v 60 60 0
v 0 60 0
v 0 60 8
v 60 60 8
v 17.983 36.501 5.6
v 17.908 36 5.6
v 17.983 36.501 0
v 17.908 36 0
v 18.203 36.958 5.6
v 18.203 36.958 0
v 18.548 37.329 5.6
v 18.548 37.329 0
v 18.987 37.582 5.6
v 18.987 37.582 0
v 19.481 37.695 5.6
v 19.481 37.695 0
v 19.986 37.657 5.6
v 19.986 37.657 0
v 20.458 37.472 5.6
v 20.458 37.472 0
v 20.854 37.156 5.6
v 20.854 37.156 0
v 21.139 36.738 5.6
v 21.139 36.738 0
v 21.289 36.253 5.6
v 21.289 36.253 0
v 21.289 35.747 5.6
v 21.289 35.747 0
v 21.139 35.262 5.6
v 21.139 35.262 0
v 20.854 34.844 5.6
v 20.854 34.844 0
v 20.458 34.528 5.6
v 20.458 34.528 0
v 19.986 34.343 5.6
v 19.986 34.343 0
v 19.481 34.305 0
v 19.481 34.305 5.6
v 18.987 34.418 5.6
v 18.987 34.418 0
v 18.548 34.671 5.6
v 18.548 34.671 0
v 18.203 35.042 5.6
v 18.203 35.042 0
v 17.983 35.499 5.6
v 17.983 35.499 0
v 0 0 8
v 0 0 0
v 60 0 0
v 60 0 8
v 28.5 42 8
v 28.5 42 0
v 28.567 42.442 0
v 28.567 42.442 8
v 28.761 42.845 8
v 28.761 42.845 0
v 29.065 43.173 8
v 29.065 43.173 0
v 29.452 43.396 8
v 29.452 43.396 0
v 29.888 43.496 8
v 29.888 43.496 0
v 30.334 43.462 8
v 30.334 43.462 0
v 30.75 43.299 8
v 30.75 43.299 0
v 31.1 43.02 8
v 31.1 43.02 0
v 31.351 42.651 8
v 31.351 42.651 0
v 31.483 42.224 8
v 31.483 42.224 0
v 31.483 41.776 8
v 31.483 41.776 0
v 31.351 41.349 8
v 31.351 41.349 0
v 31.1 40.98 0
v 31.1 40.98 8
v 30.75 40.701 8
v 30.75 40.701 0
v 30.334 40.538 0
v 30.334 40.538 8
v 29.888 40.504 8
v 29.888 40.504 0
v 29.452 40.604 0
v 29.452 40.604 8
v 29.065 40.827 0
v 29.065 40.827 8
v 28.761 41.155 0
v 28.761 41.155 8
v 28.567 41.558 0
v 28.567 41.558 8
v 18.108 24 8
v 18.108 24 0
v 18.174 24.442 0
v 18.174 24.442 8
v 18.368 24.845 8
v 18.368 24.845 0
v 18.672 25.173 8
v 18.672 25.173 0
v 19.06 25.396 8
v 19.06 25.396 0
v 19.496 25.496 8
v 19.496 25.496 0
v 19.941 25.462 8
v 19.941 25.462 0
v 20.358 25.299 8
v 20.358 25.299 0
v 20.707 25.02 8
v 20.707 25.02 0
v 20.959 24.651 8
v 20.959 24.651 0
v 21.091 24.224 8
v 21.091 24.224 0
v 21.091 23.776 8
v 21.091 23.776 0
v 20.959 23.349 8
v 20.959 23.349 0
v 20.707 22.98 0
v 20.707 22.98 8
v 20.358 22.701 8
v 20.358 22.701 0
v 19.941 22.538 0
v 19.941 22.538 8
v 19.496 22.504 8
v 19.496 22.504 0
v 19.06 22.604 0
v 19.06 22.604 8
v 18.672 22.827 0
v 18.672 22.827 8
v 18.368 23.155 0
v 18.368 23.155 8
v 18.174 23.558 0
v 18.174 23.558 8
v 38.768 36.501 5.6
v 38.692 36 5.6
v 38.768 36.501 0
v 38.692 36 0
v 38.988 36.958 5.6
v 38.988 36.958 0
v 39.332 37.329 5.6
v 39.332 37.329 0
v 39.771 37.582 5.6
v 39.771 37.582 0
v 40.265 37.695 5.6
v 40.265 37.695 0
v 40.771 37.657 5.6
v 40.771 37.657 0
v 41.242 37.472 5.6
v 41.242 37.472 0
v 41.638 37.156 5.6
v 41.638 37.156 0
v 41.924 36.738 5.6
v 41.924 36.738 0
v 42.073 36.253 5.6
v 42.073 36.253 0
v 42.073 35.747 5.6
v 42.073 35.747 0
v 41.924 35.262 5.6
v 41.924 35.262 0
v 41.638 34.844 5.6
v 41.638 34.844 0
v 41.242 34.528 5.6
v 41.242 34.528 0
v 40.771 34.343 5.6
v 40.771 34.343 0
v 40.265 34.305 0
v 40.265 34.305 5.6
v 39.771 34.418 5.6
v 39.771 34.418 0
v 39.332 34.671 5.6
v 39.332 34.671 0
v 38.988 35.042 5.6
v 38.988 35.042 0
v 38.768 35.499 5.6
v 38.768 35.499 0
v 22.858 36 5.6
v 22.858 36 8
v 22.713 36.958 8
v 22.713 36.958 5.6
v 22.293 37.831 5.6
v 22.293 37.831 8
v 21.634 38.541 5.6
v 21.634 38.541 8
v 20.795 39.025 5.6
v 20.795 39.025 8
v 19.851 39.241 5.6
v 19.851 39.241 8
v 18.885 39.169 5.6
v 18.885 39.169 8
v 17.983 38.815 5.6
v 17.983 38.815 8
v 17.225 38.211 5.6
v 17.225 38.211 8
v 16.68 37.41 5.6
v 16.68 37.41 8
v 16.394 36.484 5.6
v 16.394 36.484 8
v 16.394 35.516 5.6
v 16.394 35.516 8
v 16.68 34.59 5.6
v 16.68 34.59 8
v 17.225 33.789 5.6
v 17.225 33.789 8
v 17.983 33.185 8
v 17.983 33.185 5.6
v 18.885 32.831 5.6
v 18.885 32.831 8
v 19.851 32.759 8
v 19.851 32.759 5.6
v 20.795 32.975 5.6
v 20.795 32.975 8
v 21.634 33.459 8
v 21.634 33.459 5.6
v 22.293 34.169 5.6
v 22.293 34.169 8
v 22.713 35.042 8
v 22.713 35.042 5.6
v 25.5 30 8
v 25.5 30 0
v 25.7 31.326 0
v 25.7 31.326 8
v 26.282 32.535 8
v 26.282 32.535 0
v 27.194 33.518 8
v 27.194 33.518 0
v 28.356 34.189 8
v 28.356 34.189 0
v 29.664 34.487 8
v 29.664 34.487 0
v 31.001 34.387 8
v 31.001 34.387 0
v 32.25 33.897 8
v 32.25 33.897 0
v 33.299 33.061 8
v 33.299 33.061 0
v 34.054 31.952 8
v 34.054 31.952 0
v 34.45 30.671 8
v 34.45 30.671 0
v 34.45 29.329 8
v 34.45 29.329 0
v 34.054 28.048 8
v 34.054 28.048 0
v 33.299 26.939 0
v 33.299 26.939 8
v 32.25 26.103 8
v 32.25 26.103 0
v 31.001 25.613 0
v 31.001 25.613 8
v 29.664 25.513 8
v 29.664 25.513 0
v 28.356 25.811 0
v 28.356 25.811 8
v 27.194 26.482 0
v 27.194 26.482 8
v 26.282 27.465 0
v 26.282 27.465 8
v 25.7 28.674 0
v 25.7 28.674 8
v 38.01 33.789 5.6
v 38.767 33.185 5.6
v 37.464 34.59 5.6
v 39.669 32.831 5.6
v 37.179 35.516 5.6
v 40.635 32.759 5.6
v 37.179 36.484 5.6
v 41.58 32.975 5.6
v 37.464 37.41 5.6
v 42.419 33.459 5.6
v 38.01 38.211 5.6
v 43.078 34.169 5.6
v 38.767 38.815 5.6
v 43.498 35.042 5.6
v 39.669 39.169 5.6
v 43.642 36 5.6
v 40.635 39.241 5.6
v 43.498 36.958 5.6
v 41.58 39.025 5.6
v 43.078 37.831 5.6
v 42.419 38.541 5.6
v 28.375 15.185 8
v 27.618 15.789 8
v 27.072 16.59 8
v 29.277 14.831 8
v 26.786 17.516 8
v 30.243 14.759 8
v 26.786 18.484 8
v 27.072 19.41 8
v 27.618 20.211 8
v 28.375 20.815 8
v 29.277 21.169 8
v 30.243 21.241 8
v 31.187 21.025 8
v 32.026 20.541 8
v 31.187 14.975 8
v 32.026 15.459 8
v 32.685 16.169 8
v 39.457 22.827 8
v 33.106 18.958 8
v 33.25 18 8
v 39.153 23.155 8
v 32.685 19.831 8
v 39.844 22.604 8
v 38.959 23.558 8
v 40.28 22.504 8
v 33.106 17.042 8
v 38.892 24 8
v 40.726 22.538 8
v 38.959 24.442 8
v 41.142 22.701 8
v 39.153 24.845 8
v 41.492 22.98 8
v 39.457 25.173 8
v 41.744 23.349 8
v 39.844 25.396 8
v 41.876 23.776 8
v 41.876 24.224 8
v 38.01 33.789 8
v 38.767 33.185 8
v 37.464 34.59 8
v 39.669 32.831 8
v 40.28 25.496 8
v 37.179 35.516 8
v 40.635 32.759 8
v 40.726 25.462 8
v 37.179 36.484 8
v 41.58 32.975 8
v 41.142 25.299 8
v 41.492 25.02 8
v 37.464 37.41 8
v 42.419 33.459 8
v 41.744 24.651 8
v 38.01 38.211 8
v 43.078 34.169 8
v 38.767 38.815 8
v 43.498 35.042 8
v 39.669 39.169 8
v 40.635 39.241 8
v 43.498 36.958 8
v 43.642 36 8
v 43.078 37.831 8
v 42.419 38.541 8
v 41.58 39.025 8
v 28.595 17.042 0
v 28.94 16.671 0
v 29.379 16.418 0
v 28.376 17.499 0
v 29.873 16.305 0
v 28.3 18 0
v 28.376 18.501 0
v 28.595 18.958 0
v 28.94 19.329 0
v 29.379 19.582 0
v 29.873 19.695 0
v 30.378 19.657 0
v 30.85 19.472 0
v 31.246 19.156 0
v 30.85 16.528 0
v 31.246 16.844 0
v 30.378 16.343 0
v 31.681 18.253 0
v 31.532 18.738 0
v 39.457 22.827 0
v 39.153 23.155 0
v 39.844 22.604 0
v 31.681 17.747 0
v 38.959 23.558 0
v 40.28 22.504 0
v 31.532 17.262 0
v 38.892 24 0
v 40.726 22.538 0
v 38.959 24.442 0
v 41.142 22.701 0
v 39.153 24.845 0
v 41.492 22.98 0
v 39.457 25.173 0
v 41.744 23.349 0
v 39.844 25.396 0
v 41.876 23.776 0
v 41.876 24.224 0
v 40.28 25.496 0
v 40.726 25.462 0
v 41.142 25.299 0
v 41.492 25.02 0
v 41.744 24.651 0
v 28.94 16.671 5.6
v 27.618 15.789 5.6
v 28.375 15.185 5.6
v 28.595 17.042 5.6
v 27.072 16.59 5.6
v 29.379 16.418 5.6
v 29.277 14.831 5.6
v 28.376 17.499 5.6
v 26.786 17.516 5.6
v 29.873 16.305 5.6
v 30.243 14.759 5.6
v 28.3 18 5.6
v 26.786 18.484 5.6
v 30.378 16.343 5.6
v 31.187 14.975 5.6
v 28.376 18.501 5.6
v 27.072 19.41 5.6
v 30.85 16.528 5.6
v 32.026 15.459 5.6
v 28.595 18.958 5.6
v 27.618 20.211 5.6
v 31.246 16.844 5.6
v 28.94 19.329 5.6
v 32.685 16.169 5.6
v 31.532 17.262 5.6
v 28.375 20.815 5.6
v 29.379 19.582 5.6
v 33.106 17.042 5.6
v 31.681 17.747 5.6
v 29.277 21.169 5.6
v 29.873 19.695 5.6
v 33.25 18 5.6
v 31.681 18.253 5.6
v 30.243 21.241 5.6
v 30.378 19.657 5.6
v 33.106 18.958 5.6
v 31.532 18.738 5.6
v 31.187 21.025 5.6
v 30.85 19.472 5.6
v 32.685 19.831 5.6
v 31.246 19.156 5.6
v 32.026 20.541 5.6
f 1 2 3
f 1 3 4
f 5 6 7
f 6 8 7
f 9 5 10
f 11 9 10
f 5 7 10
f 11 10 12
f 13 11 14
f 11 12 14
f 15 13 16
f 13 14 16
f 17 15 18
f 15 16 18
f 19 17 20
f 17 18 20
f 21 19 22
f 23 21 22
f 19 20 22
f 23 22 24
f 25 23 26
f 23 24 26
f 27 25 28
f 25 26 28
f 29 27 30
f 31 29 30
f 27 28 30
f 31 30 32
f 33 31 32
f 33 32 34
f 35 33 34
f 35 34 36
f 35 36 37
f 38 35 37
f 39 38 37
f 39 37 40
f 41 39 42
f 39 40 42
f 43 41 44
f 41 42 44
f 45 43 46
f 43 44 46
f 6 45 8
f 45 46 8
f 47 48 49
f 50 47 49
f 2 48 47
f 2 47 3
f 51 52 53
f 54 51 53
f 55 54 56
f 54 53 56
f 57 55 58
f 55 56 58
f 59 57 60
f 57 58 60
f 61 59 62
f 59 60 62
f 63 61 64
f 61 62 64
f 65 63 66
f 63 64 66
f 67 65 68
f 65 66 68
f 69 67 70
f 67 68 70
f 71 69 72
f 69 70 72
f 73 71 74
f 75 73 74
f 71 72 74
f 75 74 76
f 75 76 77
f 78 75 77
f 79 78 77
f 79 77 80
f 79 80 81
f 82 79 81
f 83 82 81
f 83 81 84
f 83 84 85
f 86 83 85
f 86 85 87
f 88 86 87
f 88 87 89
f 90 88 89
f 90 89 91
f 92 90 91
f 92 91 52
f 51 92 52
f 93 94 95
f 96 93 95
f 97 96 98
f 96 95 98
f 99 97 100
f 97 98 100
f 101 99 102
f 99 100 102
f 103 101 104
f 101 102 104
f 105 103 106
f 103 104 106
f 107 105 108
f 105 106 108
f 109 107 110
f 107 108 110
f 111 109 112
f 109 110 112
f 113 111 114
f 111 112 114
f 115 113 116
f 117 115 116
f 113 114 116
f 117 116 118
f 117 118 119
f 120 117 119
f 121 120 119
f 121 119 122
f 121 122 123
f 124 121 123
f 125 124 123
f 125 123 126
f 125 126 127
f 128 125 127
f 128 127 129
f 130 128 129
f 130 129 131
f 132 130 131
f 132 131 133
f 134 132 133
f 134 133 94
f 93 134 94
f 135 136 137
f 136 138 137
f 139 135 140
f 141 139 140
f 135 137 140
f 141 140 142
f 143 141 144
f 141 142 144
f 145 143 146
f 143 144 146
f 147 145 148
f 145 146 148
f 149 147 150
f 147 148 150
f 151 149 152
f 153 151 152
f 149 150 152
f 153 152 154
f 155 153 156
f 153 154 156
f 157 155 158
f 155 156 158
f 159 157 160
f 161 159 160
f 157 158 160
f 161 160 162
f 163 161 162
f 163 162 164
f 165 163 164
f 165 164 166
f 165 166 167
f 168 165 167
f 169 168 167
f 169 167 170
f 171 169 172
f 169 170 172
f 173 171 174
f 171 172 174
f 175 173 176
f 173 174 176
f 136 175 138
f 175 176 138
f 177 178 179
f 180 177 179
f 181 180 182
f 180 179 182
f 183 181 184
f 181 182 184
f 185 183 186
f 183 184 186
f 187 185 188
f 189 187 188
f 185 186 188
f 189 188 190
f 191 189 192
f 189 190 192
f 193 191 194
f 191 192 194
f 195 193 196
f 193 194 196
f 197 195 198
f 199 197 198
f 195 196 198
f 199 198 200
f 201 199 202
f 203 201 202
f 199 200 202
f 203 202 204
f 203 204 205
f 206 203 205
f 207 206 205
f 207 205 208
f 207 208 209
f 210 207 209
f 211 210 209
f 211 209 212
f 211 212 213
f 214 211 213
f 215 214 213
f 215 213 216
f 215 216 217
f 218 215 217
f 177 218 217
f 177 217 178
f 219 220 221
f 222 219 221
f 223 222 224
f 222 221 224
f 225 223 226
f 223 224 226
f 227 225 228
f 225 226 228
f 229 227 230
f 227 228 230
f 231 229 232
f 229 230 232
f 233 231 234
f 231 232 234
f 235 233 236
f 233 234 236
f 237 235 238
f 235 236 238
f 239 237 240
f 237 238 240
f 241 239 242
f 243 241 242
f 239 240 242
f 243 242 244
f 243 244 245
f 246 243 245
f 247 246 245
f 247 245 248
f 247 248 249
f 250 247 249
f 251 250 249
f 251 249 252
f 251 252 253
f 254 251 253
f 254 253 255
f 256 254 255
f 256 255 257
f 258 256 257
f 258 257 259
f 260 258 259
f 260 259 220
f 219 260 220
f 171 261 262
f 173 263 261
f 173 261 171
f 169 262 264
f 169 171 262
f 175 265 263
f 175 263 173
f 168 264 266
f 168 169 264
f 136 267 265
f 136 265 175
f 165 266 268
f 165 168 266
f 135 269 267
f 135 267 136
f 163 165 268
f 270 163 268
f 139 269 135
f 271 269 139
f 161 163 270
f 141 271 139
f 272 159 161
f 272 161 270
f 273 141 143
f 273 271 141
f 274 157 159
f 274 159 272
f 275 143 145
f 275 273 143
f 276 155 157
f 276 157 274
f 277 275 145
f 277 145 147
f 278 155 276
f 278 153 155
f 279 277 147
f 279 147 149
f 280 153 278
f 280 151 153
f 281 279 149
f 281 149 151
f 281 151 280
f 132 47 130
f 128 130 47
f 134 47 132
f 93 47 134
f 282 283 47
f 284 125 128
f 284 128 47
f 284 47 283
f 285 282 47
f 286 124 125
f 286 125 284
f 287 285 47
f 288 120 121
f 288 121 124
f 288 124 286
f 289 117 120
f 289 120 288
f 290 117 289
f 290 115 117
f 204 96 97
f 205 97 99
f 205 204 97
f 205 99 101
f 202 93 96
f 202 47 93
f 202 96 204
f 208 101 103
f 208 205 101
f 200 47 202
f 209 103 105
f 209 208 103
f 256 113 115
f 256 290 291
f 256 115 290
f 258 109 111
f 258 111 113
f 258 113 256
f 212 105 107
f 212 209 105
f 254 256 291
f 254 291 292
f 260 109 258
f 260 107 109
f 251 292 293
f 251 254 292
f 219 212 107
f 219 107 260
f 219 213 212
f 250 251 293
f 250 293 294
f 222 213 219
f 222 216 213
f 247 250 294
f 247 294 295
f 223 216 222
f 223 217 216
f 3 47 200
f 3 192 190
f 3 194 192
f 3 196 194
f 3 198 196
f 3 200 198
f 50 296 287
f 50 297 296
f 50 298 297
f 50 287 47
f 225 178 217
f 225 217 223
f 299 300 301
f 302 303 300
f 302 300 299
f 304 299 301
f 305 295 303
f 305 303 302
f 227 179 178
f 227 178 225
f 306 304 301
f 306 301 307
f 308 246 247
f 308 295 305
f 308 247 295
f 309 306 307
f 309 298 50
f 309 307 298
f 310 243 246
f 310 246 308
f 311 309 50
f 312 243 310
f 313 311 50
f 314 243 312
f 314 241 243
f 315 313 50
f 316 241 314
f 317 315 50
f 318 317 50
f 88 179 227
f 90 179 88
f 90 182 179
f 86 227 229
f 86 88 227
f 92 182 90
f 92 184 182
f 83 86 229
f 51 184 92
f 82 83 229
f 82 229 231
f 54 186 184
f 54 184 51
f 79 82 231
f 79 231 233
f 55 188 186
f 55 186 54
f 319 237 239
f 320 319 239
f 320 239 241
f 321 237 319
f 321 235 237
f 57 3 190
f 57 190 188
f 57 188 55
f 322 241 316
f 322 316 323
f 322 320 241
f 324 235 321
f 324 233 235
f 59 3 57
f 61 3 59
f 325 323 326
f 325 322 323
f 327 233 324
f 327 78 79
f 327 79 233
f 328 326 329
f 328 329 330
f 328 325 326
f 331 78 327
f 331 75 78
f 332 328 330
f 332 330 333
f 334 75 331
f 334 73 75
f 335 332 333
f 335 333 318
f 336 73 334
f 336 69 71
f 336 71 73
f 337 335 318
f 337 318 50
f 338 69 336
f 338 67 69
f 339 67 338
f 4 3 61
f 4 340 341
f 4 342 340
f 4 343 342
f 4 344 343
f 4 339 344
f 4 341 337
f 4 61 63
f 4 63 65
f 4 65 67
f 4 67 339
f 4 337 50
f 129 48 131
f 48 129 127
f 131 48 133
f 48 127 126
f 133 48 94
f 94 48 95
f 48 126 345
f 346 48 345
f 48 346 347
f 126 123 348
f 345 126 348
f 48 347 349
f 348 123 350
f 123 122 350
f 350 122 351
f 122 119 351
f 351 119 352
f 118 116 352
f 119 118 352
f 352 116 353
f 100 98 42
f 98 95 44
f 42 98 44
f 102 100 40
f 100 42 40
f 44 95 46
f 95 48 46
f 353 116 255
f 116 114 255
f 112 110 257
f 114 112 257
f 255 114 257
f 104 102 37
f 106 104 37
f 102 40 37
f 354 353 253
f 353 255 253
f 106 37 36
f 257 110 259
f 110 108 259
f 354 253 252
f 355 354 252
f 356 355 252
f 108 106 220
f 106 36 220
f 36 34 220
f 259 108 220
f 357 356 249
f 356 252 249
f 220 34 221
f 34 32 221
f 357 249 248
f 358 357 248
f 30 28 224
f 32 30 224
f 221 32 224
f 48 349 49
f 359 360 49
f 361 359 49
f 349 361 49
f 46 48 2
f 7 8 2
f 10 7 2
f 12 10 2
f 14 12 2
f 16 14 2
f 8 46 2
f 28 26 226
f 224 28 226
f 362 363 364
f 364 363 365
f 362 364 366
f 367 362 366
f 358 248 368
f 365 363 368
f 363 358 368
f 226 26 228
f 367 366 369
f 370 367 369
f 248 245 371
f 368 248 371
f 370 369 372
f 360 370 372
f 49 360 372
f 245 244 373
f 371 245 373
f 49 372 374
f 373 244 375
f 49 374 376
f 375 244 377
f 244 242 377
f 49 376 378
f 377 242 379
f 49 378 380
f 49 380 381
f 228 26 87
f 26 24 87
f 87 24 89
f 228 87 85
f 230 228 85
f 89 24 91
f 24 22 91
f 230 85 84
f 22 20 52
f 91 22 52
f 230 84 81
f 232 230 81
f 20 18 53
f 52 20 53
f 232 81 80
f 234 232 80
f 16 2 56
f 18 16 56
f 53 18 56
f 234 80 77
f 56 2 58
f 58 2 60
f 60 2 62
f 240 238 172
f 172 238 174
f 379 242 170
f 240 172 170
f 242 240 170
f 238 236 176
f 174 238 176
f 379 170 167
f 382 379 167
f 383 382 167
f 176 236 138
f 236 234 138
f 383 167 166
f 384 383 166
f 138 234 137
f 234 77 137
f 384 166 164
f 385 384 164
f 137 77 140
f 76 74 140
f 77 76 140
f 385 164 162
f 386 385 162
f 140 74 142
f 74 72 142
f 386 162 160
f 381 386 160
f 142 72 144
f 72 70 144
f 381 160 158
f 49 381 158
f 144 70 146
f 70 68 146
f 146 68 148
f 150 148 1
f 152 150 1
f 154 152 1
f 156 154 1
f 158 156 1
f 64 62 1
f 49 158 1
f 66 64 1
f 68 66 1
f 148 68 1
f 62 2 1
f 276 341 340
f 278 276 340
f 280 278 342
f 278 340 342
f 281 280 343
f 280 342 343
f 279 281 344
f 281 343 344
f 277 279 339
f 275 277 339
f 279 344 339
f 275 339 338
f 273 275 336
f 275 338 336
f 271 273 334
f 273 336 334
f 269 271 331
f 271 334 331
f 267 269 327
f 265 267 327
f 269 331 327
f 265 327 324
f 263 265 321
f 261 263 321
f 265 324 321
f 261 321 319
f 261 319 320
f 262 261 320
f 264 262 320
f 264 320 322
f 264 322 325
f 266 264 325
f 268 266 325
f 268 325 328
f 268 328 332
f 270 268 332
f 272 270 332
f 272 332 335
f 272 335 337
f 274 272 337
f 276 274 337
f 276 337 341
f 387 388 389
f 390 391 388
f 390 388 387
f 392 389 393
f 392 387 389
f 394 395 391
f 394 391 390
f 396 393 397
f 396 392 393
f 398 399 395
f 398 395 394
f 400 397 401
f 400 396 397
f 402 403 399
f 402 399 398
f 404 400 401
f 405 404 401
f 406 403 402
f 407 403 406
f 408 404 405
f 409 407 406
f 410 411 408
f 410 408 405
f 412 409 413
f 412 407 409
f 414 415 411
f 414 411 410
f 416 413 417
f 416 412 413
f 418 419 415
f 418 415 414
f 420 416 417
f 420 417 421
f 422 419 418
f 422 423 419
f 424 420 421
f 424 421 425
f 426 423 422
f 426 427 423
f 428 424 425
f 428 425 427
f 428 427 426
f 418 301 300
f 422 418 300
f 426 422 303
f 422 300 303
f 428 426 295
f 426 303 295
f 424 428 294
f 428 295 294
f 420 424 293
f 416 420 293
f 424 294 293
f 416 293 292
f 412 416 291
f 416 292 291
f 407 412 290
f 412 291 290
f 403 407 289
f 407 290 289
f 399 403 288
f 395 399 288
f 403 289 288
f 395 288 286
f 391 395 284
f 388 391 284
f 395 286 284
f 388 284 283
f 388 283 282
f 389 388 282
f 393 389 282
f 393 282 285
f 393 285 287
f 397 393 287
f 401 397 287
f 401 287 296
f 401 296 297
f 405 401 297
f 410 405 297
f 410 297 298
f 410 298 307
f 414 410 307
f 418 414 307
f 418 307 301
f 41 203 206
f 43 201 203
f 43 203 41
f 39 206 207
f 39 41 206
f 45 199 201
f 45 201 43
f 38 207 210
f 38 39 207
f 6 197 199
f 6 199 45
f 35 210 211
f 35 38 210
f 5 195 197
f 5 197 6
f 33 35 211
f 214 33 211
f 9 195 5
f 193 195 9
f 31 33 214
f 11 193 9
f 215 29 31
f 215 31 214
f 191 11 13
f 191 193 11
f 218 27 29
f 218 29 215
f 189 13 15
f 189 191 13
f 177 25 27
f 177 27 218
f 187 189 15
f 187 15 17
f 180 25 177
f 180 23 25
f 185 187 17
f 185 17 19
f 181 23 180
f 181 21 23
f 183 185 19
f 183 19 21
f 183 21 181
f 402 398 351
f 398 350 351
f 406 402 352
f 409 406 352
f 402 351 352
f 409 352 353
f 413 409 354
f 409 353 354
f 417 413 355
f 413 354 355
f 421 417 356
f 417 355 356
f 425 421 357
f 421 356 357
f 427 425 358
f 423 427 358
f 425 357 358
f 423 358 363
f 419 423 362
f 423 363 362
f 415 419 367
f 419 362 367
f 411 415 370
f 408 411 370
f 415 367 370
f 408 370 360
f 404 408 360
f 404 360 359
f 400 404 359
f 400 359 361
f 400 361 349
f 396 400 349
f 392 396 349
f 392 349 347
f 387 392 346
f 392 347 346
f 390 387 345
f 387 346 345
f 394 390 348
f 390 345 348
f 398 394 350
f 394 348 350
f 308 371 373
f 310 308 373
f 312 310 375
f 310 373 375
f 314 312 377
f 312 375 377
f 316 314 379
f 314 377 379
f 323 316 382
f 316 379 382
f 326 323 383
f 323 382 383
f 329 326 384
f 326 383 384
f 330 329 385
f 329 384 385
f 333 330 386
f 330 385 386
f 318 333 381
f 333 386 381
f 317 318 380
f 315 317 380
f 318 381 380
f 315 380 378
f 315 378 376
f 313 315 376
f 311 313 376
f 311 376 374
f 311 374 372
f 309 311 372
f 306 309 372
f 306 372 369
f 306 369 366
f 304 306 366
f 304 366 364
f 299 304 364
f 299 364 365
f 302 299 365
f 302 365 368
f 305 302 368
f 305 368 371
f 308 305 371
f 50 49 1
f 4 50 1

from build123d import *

# Parameters (mm, degrees)
SKETCH1_W                                            = 60
SKETCH1_H                                            = 60
BOSS_EXTRUDE1_DEPTH                                  = 8
M8_CLEARANCE_HOLE1_D                                 = 9
F_3_0MM_DOWEL_HOLE1_D                                = 3
CBORE_FOR_M3_HEX_SOCKET_THIN_HEAD_CAP_SC_D           = 3.4
CBORE_FOR_M3_HEX_SOCKET_THIN_HEAD_CAP_SC_CBORE_D     = 6.5
CBORE_FOR_M3_HEX_SOCKET_THIN_HEAD_CAP_SC_CBORE_DEPTH = 2.4


with BuildPart() as part:
    # Sketch1 → Boss-Extrude1 (new body)
    with BuildSketch(Plane.XY):
        with Locations((30, 30)):
            Rectangle(SKETCH1_W, SKETCH1_H)
    extrude(amount=BOSS_EXTRUDE1_DEPTH)

    # M8 Clearance Hole1 (through all)
    with Locations(Plane.XY.offset(8)):
        with Locations((30, 30)):
            Hole(M8_CLEARANCE_HOLE1_D / 2)

    # Ø3.0mm Dowel Hole1 (through all)
    with Locations(Plane.XY.offset(8)):
        with Locations((19.607695155, 24), (30, 42), (40.392304845, 24)):
            Hole(F_3_0MM_DOWEL_HOLE1_D / 2)

    # CBORE for M3 Hex Socket Thin Head Cap Screw1 (through all)
    with Locations(Plane.XY.offset(8)):
        with Locations((40.392304845, 36), (30, 18), (19.607695155, 36)):
            CounterBoreHole(CBORE_FOR_M3_HEX_SOCKET_THIN_HEAD_CAP_SC_D / 2, CBORE_FOR_M3_HEX_SOCKET_THIN_HEAD_CAP_SC_CBORE_D / 2, CBORE_FOR_M3_HEX_SOCKET_THIN_HEAD_CAP_SC_CBORE_DEPTH)


solid = part.part
